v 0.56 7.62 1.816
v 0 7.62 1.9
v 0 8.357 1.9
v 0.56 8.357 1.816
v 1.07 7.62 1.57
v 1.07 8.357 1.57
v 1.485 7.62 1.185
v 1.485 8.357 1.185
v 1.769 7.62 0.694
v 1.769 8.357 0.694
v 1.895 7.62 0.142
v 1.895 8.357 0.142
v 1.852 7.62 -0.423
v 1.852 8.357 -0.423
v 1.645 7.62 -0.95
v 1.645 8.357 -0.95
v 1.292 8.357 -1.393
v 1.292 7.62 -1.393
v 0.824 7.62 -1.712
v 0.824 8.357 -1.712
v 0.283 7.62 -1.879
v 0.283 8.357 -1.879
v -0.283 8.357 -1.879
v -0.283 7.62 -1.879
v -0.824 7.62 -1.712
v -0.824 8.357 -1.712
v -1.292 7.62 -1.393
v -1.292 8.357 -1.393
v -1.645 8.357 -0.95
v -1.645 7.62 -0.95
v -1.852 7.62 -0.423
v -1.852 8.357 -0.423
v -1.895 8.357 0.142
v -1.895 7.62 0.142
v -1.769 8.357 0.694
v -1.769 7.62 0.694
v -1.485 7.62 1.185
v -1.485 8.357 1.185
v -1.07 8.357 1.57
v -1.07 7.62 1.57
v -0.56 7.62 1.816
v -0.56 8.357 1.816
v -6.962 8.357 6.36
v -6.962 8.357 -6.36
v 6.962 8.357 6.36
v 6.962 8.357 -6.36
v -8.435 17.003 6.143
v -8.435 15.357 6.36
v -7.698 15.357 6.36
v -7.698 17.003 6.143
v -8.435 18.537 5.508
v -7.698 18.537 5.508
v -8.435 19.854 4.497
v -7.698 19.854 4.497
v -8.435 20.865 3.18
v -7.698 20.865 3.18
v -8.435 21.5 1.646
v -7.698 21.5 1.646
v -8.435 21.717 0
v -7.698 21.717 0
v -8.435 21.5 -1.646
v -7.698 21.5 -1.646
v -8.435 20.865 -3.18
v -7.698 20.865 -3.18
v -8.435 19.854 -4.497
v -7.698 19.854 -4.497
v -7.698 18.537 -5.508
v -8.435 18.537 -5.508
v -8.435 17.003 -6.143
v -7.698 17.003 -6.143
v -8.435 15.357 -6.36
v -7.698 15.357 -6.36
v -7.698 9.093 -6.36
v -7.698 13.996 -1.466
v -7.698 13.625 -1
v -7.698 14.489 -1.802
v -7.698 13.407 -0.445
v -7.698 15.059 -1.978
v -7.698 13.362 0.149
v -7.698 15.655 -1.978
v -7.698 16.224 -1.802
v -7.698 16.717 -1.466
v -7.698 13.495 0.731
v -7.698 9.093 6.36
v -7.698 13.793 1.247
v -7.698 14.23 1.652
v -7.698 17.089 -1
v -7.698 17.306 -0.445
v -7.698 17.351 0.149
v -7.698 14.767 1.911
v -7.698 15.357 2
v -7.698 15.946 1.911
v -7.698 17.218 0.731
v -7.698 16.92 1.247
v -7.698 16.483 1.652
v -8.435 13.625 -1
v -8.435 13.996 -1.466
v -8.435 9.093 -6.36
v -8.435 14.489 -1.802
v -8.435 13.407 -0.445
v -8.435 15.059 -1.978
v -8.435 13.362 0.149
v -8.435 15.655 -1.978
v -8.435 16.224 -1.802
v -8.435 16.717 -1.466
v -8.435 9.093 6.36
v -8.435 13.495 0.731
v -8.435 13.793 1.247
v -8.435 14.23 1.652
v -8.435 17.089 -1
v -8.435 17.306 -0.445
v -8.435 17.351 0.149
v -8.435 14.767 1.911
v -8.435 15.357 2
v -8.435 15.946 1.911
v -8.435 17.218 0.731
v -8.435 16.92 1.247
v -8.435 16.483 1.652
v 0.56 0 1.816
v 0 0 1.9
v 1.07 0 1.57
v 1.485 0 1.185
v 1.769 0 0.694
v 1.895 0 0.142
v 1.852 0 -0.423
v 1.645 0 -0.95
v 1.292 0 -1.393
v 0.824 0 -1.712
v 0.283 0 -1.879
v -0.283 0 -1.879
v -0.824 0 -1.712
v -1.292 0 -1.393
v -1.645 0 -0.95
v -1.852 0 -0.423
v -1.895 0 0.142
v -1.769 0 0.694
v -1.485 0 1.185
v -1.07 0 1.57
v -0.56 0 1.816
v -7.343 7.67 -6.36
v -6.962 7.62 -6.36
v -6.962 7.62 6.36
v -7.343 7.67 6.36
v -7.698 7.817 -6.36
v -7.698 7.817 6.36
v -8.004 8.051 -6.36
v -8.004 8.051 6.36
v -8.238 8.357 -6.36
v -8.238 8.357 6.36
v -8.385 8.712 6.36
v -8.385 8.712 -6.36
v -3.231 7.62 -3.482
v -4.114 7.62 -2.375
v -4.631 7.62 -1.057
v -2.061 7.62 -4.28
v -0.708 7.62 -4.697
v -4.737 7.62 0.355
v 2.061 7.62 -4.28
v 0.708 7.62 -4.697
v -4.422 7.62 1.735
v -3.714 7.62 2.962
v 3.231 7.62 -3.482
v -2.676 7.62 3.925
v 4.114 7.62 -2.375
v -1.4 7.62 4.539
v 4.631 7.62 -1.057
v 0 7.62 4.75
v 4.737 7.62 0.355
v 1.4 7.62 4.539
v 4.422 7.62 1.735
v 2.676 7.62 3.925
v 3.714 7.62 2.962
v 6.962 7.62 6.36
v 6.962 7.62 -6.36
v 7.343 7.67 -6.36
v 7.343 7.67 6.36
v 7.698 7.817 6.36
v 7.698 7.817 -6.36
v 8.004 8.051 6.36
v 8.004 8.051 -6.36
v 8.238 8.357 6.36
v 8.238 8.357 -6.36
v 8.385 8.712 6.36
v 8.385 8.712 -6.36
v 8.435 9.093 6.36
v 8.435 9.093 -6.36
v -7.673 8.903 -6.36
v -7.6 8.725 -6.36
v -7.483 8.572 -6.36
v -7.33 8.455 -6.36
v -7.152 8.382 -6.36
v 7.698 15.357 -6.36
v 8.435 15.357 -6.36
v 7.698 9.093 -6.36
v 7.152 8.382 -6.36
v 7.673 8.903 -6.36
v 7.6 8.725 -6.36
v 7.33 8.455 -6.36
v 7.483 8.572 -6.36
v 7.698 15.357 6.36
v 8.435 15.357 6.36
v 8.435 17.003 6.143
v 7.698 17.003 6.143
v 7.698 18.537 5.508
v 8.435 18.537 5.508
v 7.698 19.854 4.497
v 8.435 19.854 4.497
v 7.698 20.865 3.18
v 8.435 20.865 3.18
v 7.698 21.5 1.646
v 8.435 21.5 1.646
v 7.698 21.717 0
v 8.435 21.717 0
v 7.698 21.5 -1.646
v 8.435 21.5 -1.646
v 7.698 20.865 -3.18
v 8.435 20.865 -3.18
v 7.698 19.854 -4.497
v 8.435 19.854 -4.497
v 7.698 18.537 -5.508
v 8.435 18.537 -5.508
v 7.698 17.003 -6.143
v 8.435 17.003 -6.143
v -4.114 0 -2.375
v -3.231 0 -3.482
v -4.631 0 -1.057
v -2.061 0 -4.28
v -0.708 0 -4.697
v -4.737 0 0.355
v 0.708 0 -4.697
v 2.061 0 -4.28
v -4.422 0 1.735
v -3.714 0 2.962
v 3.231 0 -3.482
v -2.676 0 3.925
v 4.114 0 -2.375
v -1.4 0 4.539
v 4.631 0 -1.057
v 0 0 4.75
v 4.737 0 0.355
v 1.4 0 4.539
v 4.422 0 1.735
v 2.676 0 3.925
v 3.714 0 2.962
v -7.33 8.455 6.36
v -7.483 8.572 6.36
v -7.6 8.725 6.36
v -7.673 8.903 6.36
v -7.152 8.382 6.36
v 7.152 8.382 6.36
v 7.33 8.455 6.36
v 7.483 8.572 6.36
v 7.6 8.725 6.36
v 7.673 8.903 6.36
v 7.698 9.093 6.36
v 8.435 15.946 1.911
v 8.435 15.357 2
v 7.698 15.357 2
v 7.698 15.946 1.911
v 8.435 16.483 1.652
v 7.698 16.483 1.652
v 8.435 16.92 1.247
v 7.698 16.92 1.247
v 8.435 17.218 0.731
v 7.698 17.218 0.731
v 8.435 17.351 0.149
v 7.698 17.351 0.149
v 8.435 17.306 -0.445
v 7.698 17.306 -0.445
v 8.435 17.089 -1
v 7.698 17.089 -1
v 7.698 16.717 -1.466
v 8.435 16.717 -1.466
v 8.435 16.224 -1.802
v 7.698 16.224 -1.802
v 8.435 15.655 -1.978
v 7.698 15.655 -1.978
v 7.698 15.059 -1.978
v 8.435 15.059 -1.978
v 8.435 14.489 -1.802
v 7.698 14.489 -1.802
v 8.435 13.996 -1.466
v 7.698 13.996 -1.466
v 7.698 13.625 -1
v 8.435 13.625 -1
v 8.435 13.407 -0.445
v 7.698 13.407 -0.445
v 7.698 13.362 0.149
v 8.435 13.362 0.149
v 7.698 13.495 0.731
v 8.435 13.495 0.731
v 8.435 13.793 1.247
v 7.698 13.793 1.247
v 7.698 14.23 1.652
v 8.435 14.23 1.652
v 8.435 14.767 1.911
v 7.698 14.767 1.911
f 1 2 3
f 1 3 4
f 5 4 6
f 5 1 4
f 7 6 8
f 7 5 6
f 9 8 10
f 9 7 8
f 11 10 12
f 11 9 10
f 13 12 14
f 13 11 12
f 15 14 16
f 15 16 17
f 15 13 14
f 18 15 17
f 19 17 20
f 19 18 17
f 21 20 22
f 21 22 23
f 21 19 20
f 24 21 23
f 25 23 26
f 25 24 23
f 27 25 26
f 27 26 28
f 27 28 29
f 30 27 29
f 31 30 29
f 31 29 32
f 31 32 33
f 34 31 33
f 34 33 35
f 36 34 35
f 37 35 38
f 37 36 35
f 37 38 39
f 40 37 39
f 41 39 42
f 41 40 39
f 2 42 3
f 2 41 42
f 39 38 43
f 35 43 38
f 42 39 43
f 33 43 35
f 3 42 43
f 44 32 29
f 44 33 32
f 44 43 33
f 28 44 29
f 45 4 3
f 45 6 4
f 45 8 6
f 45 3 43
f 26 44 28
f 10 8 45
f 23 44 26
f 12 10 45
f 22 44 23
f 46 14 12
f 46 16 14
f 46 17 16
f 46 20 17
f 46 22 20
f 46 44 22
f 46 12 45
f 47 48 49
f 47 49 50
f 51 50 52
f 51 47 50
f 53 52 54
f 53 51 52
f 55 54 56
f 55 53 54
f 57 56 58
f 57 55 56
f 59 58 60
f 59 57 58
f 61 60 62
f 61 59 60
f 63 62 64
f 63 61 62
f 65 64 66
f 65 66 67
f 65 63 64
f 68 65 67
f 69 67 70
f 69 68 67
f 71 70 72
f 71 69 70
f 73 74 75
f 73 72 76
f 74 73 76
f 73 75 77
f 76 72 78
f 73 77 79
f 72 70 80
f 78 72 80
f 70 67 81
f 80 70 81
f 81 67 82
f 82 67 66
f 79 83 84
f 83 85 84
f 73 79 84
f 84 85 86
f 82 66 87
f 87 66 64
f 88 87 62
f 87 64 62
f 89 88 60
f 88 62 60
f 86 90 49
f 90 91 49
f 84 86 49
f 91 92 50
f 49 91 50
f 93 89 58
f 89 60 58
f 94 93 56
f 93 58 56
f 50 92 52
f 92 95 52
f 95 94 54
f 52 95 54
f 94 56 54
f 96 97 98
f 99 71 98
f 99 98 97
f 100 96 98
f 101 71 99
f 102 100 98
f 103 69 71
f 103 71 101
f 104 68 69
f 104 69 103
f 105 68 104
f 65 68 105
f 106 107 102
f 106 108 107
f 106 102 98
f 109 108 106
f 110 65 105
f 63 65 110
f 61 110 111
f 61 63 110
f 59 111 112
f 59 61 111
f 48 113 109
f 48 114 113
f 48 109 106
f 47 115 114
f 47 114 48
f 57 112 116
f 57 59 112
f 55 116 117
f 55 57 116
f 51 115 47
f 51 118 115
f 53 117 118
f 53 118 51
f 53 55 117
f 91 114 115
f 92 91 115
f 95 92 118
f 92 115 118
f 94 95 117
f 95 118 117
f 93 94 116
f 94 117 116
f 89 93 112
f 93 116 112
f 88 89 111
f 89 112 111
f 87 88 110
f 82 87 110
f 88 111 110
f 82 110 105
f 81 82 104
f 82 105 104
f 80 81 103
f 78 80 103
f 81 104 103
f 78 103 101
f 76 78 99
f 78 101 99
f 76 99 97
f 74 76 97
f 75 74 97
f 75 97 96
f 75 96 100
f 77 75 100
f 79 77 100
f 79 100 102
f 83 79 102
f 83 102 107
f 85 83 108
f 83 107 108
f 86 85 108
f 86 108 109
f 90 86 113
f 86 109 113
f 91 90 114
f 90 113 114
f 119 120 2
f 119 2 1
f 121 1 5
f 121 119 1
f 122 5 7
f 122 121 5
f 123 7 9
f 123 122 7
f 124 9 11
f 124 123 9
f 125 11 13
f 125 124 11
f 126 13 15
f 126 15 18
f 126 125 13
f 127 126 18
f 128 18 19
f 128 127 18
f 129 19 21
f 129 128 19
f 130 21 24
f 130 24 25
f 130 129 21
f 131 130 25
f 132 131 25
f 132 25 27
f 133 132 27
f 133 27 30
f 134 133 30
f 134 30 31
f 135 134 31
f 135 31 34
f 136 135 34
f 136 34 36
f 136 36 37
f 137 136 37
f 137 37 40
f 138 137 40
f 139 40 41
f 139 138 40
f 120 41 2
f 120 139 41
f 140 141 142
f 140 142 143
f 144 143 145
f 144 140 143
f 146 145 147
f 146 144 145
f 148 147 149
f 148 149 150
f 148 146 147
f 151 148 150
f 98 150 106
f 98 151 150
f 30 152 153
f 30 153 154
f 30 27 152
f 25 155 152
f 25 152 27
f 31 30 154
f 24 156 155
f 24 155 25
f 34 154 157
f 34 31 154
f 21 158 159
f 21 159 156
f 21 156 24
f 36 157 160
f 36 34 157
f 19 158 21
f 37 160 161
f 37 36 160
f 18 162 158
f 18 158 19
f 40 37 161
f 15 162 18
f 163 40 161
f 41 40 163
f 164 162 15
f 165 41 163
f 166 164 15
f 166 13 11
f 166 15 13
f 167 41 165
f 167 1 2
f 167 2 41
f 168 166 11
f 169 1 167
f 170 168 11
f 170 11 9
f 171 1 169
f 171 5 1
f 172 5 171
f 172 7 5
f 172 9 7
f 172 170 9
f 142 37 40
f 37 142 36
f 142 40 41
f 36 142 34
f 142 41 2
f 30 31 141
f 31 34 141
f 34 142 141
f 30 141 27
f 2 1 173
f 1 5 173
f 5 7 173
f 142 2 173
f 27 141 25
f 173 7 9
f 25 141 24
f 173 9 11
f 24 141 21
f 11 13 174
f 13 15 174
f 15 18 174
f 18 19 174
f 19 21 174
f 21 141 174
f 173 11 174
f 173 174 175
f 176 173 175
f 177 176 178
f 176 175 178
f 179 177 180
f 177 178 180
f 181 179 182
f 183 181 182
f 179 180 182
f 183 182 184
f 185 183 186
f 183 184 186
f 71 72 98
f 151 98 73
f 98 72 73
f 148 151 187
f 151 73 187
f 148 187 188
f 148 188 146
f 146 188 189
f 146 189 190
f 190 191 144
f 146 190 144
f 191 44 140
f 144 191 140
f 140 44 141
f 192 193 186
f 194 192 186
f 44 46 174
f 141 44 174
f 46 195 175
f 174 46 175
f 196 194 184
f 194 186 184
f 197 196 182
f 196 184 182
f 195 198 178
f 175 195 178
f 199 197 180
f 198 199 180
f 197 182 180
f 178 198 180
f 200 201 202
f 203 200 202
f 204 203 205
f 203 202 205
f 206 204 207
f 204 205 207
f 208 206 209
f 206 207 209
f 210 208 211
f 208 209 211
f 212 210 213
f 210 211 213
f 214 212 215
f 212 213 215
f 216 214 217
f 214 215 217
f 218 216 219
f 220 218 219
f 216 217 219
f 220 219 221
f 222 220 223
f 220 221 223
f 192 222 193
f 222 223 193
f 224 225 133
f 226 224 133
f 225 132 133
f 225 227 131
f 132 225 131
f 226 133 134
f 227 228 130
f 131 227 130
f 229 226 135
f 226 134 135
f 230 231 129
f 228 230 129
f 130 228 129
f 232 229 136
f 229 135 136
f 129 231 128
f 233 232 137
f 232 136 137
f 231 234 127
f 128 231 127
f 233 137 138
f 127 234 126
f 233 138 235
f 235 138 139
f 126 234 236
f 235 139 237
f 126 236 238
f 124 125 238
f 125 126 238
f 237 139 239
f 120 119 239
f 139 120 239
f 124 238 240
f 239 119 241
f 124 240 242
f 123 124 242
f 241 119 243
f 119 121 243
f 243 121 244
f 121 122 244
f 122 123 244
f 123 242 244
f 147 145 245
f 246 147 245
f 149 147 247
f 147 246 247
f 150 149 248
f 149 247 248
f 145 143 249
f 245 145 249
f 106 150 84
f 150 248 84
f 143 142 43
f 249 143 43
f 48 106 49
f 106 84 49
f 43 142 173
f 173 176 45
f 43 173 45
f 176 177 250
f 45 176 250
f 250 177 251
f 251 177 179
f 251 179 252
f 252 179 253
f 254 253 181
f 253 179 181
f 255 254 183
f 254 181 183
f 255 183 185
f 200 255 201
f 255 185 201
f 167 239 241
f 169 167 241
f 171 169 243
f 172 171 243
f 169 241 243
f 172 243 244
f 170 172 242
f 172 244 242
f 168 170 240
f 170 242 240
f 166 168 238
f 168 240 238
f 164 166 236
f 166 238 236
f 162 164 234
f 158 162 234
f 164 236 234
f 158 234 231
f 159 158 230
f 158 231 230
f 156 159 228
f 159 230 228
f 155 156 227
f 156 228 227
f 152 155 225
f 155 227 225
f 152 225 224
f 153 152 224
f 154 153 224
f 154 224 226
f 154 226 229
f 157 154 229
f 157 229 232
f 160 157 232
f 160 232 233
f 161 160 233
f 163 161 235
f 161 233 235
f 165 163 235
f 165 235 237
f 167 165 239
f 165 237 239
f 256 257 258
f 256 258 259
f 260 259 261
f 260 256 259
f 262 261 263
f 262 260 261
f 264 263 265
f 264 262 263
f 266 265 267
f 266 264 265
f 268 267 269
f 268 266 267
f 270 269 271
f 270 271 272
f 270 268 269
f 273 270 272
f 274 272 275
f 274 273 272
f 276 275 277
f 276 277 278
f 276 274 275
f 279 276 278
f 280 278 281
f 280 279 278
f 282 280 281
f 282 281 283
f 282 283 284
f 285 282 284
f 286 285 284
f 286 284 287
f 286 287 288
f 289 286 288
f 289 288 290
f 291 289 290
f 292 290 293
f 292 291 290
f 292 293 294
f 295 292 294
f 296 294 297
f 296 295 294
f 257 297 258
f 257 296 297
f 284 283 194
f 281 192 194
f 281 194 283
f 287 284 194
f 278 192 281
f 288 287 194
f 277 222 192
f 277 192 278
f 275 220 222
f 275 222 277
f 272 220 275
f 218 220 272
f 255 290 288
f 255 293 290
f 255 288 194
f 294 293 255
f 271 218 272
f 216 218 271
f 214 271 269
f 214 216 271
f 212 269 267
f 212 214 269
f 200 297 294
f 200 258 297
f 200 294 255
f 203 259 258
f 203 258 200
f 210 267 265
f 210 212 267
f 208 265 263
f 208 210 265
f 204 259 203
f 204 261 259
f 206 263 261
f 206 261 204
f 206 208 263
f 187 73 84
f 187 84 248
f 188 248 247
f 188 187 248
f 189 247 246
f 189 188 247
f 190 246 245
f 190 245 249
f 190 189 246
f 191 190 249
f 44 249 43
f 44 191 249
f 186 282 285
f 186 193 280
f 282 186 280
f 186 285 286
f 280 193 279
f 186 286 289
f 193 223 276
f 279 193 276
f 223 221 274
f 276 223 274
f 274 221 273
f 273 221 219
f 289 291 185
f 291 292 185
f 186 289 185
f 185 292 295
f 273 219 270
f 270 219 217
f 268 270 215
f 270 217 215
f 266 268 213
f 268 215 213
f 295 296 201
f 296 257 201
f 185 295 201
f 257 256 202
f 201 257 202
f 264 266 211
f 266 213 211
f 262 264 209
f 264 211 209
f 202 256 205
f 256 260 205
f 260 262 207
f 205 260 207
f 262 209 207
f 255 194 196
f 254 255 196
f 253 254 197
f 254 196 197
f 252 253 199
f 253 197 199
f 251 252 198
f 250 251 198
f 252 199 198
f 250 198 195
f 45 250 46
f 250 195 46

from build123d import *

# Parameters (mm, degrees)
SKETCH1_R                    = 4.75
SKETCH1_R_2                  = 1.9
BOSS_EXTRUDE1_DEPTH          = 7.62
SKETCH2_W                    = 14.87
SKETCH2_H                    = 12.72
SKETCH2_R                    = 1.9
BASE_FLANGE1_DEPTH           = 0.7366
EDGE_FLANGE1_STRIP_W         = 5.4196
EDGE_FLANGE1_STRIP_H         = 0.7366
EDGE_FLANGE1_STRIP_CUT_DEPTH = 12.72
EDGE_FLANGE1_DEPTH           = 12.72
EDGE_FLANGE1_PROFILE_R       = 2
EDGE_FLANGE1_FLAT_DEPTH      = 0.7366


# Sheet-metal steps are written as plain solids
with BuildPart() as part:
    # Sketch1 → Boss-Extrude1 (new body)
    with BuildSketch(Plane(origin=(0, 0, 0), x_dir=(1, 0, 0), z_dir=(0, 1, 0))):
        with Locations(Location((0, 0, 0), (0, 0, 270))):
            Circle(SKETCH1_R)
        with Locations(Location((0, 0, 0), (0, 0, 270))):
            Circle(SKETCH1_R_2, mode=Mode.SUBTRACT)
    extrude(amount=BOSS_EXTRUDE1_DEPTH)


with BuildPart() as body_2:
    # Sketch2 → Base-Flange1 (new body)
    with BuildSketch(Plane(origin=(0, 7.62, 0), x_dir=(1, 0, 0), z_dir=(0, 1, 0))):
        Rectangle(SKETCH2_W, SKETCH2_H)
        with Locations(Location((0, 0, 0), (0, 0, 270))):
            Circle(SKETCH2_R, mode=Mode.SUBTRACT)
    extrude(amount=BASE_FLANGE1_DEPTH)

    # Edge-Flange1 strip (across the edge) → Edge-Flange1 strip cut (cut)
    with BuildSketch(Plane(origin=(-8.435, 8.3566, -6.36), x_dir=(1, 0, 0), z_dir=(0, 0, 1))):
        with Locations((-1.2366, -0.3683)):
            Rectangle(EDGE_FLANGE1_STRIP_W, EDGE_FLANGE1_STRIP_H)
    edge_flange1_strip_cut = extrude(amount=EDGE_FLANGE1_STRIP_CUT_DEPTH, mode=Mode.SUBTRACT)

    # Edge-Flange1 bend section (across the edge) → Edge-Flange1 (add)
    with BuildSketch(Plane(origin=(-8.435, 8.3566, -6.36), x_dir=(1, 0, 0), z_dir=(0, 0, 1))):
        with BuildLine():
            Line((0, 0.7366), (0.7366, 0.7366))
            ThreePointArc((0.7366, 0.7366), (0.952345145, 0.215745145), (1.4732, 0))
            Line((1.4732, 0), (1.4732, -0.7366))
            ThreePointArc((1.4732, -0.7366), (0.43149029, -0.30510971), (0, 0.7366))
        make_face()
    edge_flange1 = extrude(amount=EDGE_FLANGE1_DEPTH)

    # Edge-Flange1 profile (on flange) → Edge-Flange1 flat (add)
    with BuildSketch(Plane(origin=(-8.435, 8.3566, 0), x_dir=(0, 0, 1), z_dir=(-1, 0, 0))):
        with BuildLine():
            ThreePointArc((6.36, 7), (0, 13.36), (-6.36, 7))
            Line((-6.36, 7), (-6.36, 0.7366))
            Line((-6.36, 0.7366), (6.36, 0.7366))
            Line((6.36, 0.7366), (6.36, 7))
        make_face()
        with Locations((0, 7)):
            Circle(EDGE_FLANGE1_PROFILE_R, mode=Mode.SUBTRACT)
    edge_flange1_flat = extrude(amount=-EDGE_FLANGE1_FLAT_DEPTH)

    # Mirror1: Edge-Flange1 strip cut, Edge-Flange1, Edge-Flange1 flat across plane
    add(edge_flange1_strip_cut.mirror(Plane(origin=(0, 0, 0), x_dir=(0, 0, 1), z_dir=(1, 0, 0))), mode=Mode.SUBTRACT)
    add(edge_flange1.mirror(Plane(origin=(0, 0, 0), x_dir=(0, 0, 1), z_dir=(1, 0, 0))))
    add(edge_flange1_flat.mirror(Plane(origin=(0, 0, 0), x_dir=(0, 0, 1), z_dir=(1, 0, 0))))


solid = Compound([part.part, body_2.part])
